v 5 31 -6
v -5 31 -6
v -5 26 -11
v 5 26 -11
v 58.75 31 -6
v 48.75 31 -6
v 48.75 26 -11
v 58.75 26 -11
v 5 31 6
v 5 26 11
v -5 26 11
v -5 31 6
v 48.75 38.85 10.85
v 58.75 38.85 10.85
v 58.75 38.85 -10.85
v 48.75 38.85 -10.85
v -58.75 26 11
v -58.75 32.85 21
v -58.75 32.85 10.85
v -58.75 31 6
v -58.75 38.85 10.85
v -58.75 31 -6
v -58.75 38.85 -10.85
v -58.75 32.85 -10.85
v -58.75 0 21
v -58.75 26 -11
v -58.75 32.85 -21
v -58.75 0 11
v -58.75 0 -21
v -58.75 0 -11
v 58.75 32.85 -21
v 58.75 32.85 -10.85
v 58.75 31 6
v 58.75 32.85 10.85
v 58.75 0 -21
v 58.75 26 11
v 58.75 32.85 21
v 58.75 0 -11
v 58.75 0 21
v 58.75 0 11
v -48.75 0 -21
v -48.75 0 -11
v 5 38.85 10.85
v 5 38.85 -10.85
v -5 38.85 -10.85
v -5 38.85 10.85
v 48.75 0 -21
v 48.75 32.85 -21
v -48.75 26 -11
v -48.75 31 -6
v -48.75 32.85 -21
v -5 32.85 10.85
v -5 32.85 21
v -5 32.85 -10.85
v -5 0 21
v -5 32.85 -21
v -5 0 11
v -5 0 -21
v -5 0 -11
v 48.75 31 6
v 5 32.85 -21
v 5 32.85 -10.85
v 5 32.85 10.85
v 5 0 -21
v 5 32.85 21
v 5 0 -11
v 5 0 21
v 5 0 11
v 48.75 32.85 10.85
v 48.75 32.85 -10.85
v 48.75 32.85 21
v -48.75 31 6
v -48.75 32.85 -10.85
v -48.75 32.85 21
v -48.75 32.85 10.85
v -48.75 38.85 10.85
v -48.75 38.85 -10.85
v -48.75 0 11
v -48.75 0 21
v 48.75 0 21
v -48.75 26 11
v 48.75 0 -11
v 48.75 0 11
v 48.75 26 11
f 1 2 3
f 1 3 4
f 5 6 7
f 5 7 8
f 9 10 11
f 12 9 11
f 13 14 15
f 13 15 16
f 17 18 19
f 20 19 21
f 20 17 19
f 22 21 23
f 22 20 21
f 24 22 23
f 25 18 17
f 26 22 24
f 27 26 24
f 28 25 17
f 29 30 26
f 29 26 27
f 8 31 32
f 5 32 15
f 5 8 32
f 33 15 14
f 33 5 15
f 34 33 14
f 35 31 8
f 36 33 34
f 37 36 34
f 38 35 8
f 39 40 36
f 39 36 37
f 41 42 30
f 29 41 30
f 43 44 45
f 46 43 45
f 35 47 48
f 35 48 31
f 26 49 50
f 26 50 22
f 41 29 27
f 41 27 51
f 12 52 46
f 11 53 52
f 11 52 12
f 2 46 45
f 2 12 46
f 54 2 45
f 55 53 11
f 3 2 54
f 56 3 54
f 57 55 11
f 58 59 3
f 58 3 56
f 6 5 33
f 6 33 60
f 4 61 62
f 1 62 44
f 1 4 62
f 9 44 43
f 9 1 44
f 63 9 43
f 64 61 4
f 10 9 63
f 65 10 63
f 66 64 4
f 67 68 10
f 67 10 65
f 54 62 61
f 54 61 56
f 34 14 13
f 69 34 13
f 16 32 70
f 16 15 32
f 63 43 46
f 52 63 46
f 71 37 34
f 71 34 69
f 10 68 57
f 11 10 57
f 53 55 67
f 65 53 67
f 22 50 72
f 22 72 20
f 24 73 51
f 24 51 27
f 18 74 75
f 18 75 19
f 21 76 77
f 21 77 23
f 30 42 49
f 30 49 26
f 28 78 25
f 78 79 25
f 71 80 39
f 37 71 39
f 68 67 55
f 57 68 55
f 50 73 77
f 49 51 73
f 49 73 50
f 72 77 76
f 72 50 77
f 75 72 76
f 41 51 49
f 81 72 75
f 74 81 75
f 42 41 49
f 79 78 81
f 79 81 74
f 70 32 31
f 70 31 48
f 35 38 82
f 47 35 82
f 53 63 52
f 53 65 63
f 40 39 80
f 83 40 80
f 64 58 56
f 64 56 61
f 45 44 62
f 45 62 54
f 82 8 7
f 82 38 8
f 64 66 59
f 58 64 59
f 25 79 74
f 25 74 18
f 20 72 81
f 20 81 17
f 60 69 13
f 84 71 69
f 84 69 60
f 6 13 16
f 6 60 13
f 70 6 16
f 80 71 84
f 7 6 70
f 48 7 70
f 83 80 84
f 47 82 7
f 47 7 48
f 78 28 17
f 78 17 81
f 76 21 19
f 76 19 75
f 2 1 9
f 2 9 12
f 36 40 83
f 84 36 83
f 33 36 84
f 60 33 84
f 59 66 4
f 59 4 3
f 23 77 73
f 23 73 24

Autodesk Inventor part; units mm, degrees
ref_plane "YZ Plane" through (0, 0, 0) normal (1, 0, 0) x (0, 1, 0)
ref_plane "XY Plane" through (0, 0, 0) normal (0, 0, 1) x (1, 0, 0)
sketch "スケッチ1" plane through (0, 0, 0) normal (0, 1, 0) x (-1, 0, 0)
  line L0 (-58.75, -21) -> (-58.75, 21)
  line L1 (58.75, 21) -> (58.75, -21)
  line L2 (0, -29.4) -> (0, 29.4) projected
  line L3 (-82.25, 0) -> (82.25, 0) projected
  line L4 (58.75, -21) -> (48.75, -21)
  line L5 (48.75, -21) -> (48.75, -11)
  line L6 (48.75, -11) -> (58.75, -11)
  line L7 (58.75, -11) -> (58.75, -21)
  line L8 (5, -21) -> (-5, -21)
  line L9 (-5, -21) -> (-5, -11)
  line L10 (-5, -11) -> (5, -11)
  line L11 (5, -11) -> (5, -21)
  line L12 (-48.75, -21) -> (-58.75, -21)
  line L13 (-58.75, -21) -> (-58.75, -11)
  line L14 (-58.75, -11) -> (-48.75, -11)
  line L15 (-48.75, -11) -> (-48.75, -21)
  line L16 (-58.75, 11) -> (-48.75, 11)
  line L17 (-48.75, 11) -> (-48.75, 21)
  line L18 (-48.75, 21) -> (-58.75, 21)
  line L19 (-58.75, 21) -> (-58.75, 11)
  line L20 (5, 21) -> (-5, 21)
  line L21 (-5, 21) -> (-5, 11)
  line L22 (-5, 11) -> (5, 11)
  line L23 (5, 11) -> (5, 21)
  line L24 (58.75, 11) -> (48.75, 11)
  line L25 (48.75, 11) -> (48.75, 21)
  line L26 (48.75, 21) -> (58.75, 21)
  line L27 (58.75, 21) -> (58.75, 11)
  line L28 (5, -11) -> (5, 11)
  line L29 (48.75, 11) -> (48.75, -11)
  line L30 (-48.75, -11) -> (-48.75, 11)
  line L31 (-5, 11) -> (-5, -11)
  line L32 (55.75, 11) -> (55.75, -11)
  line L33 (-55.75, -11) -> (-55.75, 11)
  line L34 (2, 11) -> (2, -11)
  line L35 (-2, -11) -> (-2, 11)
  line L36 (51.75, -11) -> (51.75, 11)
  line L37 (-51.75, -11) -> (-51.75, 11)
  line L38 (-58.75, 21) -> (-48.75, 21)
  line L39 (-5, 21) -> (5, 21)
  line L40 (48.75, 21) -> (58.75, 21)
  line L41 (58.75, -21) -> (48.75, -21)
  line L42 (5, -21) -> (-5, -21)
  line L43 (-48.75, -21) -> (-58.75, -21)
  point P0 (0, 0)
  dimension "d0" = 117.5
  dimension "d2" = 10
  dimension "d10" = 3
  dimension "d13" = 3
  dimension "d92" = 3
  dimension "d119" = 22
  dimension "d120" = 10
extrude "押し出し1" add sketch "スケッチ1" along normal blind 33 contours L0 L14 L15 L12 | L0 L18 L17 L16 | L1 L24 L25 L26 | L1 L4 L5 L6 | L8 L9 L10 L2 | L2 L10 L11 L8 | L22 L21 L20 L2 | L2 L20 L23 L22
extrude "押し出し4" [suppressed]
ref_plane "作業平面2" through (0, 39, 0) normal (0, 1, 0) x (-1, 0, 0)
sketch "スケッチ2" plane through (0, 39, 0) normal (0, 1, 0) x (-1, 0, 0)
  line L0 (58.75, 21) -> (58.75, -21) projected
  line L1 (55.75, 11) -> (55.75, -11) projected
  line L2 (51.75, -11) -> (51.75, 11) projected
  line L3 (48.75, 11) -> (48.75, -11) projected
  line L4 (58.75, 11) -> (48.75, 11) projected
  line L5 (48.75, -11) -> (58.75, -11) projected
  line L6 (58.75, -21) -> (48.75, -21) projected
  line L7 (48.75, -21) -> (48.75, -11) projected
  line L8 (48.75, 11) -> (48.75, 21) projected
  line L9 (5, 11) -> (5, 21) projected
  line L10 (-5, 11) -> (5, 11) projected
  line L11 (-5, 21) -> (-5, 11) projected
  line L12 (5, -11) -> (5, -21) projected
  line L13 (-5, -11) -> (5, -11) projected
  line L14 (-5, -21) -> (-5, -11) projected
  line L15 (5, -21) -> (-5, -21) projected
  line L16 (-5, 11) -> (-5, -11) projected
  line L17 (-2, -11) -> (-2, 11) projected
  line L18 (2, 11) -> (2, -11) projected
  line L19 (5, -11) -> (5, 11) projected
  line L20 (-48.75, 11) -> (-48.75, 21) projected
  line L21 (-48.75, -11) -> (-48.75, 11) projected
  line L22 (-48.75, -11) -> (-48.75, -21) projected
  line L23 (-58.75, -21) -> (-58.75, 21) projected
  line L24 (-58.75, -11) -> (-48.75, -11) projected
  line L25 (-58.75, 11) -> (-48.75, 11) projected
  line L26 (-51.75, -11) -> (-51.75, 11) projected
  line L27 (-55.75, -11) -> (-55.75, 11) projected
extrude "押し出し6" add sketch "スケッチ2" against normal blind 8 contours L0 L5 L1 L4 | L1 L5 L2 L4 | L2 L5 L3 L4 | L10 L17 L13 L16 | L10 L18 L13 L17 | L10 L19 L13 L18 | L24 L26 L25 L21 | L24 L27 L25 L26 | L24 L23 L25 L27
extrude "押し出し7" [suppressed]
thicken "厚み1" operation cut thickness 0.15 both sides no extend neighbours no toward (0, -1, 0) faces at (55.4167, 33, -14.3333) (55.4167, 33, 17.6667) (52.0833, 37, 11) (55.4167, 37, -11) (55.4167, 39, 3.6667)
thicken "厚み2" operation cut thickness 0.15 both sides no extend neighbours no toward (0, -1, 0) faces at (1.6667, 33, -14.3333) (1.6667, 33, 17.6667) (1.6667, 39, 3.6667) (1.6667, 37, -11) (-1.6667, 37, 11)
thicken "厚み3" operation cut thickness 0.15 both sides no extend neighbours no toward (0, -1, 0) faces at (-52.0833, 33, -14.3333) (-52.0833, 33, 17.6667) (-55.4167, 37, 11) (-55.4167, 39, -3.6667) (-52.0833, 37, -11)
sketch "SupportBase" plane through (0, 0, 0) normal (0, -1, 0) x (1, 0, 0)
  line L0 (-48.75, 11) -> (-48.75, -11)
  line L1 (-48.75, -11) -> (-5, -11)
  line L2 (-48.75, 11) -> (-5, 11)
  line L3 (-5, 11) -> (-5, -11)
  line L4 (5, 11) -> (5, -11)
  line L5 (5, -11) -> (48.75, -11)
  line L6 (48.75, -11) -> (48.75, 11)
  line L7 (5, 11) -> (48.75, 11)
sketch "SupportTarget" plane through (0, 31, 0) normal (0, -1, 0) x (1, 0, 0)
  line L0 (48.75, 11) -> (58.75, 11) projected
  line L1 (48.75, 11) -> (48.75, -11) projected
  line L2 (58.75, -11) -> (48.75, -11) projected
  line L3 (58.75, -11) -> (58.75, 11) projected
  line L4 (-5, 11) -> (5, 11) projected
  line L5 (-5, 11) -> (-5, -11) projected
  line L6 (5, -11) -> (-5, -11) projected
  line L7 (5, -11) -> (5, 11) projected
  line L8 (-58.75, 11) -> (-58.75, -11) projected
  line L9 (-48.75, -11) -> (-58.75, -11) projected
  line L10 (-48.75, -11) -> (-48.75, 11) projected
  line L11 (-58.75, 11) -> (-48.75, 11) projected
chamfer "面取り6" distance 5 angle 45 6 edges at (-53.75, 31, -11) (0, 31, -11) (53.75, 31, -11) (-53.75, 31, 11) (0, 31, 11) (53.75, 31, 11)
equation "\"d2\" = VPW"
equation "\"d10\" = ID"
equation "\"d13\" = ID"
equation "\"d4\" = UnitHeight"
equation "\"d14\" = 2 * ID"
equation "\"d25\" = VBW"
equation "\"d27\" = 2 * ID"
equation "\"d36\" = OF"
equation "\"d3\" = VPW"
equation "\"UnitHeight\" = 0.5 * ViaductHeight"
equation "\"ID\" = 3"
equation "\"VPW\" = 10"
equation "\"d11\" = ID"
equation "\"VBW\" = 8"
equation "\"OF\" = 0.15"
equation "\"d37\" = UnitHeight + 2 * ID"
equation "\"ViaductHeight\" = 66"
properties part number "ViaductPillarsUnit"
